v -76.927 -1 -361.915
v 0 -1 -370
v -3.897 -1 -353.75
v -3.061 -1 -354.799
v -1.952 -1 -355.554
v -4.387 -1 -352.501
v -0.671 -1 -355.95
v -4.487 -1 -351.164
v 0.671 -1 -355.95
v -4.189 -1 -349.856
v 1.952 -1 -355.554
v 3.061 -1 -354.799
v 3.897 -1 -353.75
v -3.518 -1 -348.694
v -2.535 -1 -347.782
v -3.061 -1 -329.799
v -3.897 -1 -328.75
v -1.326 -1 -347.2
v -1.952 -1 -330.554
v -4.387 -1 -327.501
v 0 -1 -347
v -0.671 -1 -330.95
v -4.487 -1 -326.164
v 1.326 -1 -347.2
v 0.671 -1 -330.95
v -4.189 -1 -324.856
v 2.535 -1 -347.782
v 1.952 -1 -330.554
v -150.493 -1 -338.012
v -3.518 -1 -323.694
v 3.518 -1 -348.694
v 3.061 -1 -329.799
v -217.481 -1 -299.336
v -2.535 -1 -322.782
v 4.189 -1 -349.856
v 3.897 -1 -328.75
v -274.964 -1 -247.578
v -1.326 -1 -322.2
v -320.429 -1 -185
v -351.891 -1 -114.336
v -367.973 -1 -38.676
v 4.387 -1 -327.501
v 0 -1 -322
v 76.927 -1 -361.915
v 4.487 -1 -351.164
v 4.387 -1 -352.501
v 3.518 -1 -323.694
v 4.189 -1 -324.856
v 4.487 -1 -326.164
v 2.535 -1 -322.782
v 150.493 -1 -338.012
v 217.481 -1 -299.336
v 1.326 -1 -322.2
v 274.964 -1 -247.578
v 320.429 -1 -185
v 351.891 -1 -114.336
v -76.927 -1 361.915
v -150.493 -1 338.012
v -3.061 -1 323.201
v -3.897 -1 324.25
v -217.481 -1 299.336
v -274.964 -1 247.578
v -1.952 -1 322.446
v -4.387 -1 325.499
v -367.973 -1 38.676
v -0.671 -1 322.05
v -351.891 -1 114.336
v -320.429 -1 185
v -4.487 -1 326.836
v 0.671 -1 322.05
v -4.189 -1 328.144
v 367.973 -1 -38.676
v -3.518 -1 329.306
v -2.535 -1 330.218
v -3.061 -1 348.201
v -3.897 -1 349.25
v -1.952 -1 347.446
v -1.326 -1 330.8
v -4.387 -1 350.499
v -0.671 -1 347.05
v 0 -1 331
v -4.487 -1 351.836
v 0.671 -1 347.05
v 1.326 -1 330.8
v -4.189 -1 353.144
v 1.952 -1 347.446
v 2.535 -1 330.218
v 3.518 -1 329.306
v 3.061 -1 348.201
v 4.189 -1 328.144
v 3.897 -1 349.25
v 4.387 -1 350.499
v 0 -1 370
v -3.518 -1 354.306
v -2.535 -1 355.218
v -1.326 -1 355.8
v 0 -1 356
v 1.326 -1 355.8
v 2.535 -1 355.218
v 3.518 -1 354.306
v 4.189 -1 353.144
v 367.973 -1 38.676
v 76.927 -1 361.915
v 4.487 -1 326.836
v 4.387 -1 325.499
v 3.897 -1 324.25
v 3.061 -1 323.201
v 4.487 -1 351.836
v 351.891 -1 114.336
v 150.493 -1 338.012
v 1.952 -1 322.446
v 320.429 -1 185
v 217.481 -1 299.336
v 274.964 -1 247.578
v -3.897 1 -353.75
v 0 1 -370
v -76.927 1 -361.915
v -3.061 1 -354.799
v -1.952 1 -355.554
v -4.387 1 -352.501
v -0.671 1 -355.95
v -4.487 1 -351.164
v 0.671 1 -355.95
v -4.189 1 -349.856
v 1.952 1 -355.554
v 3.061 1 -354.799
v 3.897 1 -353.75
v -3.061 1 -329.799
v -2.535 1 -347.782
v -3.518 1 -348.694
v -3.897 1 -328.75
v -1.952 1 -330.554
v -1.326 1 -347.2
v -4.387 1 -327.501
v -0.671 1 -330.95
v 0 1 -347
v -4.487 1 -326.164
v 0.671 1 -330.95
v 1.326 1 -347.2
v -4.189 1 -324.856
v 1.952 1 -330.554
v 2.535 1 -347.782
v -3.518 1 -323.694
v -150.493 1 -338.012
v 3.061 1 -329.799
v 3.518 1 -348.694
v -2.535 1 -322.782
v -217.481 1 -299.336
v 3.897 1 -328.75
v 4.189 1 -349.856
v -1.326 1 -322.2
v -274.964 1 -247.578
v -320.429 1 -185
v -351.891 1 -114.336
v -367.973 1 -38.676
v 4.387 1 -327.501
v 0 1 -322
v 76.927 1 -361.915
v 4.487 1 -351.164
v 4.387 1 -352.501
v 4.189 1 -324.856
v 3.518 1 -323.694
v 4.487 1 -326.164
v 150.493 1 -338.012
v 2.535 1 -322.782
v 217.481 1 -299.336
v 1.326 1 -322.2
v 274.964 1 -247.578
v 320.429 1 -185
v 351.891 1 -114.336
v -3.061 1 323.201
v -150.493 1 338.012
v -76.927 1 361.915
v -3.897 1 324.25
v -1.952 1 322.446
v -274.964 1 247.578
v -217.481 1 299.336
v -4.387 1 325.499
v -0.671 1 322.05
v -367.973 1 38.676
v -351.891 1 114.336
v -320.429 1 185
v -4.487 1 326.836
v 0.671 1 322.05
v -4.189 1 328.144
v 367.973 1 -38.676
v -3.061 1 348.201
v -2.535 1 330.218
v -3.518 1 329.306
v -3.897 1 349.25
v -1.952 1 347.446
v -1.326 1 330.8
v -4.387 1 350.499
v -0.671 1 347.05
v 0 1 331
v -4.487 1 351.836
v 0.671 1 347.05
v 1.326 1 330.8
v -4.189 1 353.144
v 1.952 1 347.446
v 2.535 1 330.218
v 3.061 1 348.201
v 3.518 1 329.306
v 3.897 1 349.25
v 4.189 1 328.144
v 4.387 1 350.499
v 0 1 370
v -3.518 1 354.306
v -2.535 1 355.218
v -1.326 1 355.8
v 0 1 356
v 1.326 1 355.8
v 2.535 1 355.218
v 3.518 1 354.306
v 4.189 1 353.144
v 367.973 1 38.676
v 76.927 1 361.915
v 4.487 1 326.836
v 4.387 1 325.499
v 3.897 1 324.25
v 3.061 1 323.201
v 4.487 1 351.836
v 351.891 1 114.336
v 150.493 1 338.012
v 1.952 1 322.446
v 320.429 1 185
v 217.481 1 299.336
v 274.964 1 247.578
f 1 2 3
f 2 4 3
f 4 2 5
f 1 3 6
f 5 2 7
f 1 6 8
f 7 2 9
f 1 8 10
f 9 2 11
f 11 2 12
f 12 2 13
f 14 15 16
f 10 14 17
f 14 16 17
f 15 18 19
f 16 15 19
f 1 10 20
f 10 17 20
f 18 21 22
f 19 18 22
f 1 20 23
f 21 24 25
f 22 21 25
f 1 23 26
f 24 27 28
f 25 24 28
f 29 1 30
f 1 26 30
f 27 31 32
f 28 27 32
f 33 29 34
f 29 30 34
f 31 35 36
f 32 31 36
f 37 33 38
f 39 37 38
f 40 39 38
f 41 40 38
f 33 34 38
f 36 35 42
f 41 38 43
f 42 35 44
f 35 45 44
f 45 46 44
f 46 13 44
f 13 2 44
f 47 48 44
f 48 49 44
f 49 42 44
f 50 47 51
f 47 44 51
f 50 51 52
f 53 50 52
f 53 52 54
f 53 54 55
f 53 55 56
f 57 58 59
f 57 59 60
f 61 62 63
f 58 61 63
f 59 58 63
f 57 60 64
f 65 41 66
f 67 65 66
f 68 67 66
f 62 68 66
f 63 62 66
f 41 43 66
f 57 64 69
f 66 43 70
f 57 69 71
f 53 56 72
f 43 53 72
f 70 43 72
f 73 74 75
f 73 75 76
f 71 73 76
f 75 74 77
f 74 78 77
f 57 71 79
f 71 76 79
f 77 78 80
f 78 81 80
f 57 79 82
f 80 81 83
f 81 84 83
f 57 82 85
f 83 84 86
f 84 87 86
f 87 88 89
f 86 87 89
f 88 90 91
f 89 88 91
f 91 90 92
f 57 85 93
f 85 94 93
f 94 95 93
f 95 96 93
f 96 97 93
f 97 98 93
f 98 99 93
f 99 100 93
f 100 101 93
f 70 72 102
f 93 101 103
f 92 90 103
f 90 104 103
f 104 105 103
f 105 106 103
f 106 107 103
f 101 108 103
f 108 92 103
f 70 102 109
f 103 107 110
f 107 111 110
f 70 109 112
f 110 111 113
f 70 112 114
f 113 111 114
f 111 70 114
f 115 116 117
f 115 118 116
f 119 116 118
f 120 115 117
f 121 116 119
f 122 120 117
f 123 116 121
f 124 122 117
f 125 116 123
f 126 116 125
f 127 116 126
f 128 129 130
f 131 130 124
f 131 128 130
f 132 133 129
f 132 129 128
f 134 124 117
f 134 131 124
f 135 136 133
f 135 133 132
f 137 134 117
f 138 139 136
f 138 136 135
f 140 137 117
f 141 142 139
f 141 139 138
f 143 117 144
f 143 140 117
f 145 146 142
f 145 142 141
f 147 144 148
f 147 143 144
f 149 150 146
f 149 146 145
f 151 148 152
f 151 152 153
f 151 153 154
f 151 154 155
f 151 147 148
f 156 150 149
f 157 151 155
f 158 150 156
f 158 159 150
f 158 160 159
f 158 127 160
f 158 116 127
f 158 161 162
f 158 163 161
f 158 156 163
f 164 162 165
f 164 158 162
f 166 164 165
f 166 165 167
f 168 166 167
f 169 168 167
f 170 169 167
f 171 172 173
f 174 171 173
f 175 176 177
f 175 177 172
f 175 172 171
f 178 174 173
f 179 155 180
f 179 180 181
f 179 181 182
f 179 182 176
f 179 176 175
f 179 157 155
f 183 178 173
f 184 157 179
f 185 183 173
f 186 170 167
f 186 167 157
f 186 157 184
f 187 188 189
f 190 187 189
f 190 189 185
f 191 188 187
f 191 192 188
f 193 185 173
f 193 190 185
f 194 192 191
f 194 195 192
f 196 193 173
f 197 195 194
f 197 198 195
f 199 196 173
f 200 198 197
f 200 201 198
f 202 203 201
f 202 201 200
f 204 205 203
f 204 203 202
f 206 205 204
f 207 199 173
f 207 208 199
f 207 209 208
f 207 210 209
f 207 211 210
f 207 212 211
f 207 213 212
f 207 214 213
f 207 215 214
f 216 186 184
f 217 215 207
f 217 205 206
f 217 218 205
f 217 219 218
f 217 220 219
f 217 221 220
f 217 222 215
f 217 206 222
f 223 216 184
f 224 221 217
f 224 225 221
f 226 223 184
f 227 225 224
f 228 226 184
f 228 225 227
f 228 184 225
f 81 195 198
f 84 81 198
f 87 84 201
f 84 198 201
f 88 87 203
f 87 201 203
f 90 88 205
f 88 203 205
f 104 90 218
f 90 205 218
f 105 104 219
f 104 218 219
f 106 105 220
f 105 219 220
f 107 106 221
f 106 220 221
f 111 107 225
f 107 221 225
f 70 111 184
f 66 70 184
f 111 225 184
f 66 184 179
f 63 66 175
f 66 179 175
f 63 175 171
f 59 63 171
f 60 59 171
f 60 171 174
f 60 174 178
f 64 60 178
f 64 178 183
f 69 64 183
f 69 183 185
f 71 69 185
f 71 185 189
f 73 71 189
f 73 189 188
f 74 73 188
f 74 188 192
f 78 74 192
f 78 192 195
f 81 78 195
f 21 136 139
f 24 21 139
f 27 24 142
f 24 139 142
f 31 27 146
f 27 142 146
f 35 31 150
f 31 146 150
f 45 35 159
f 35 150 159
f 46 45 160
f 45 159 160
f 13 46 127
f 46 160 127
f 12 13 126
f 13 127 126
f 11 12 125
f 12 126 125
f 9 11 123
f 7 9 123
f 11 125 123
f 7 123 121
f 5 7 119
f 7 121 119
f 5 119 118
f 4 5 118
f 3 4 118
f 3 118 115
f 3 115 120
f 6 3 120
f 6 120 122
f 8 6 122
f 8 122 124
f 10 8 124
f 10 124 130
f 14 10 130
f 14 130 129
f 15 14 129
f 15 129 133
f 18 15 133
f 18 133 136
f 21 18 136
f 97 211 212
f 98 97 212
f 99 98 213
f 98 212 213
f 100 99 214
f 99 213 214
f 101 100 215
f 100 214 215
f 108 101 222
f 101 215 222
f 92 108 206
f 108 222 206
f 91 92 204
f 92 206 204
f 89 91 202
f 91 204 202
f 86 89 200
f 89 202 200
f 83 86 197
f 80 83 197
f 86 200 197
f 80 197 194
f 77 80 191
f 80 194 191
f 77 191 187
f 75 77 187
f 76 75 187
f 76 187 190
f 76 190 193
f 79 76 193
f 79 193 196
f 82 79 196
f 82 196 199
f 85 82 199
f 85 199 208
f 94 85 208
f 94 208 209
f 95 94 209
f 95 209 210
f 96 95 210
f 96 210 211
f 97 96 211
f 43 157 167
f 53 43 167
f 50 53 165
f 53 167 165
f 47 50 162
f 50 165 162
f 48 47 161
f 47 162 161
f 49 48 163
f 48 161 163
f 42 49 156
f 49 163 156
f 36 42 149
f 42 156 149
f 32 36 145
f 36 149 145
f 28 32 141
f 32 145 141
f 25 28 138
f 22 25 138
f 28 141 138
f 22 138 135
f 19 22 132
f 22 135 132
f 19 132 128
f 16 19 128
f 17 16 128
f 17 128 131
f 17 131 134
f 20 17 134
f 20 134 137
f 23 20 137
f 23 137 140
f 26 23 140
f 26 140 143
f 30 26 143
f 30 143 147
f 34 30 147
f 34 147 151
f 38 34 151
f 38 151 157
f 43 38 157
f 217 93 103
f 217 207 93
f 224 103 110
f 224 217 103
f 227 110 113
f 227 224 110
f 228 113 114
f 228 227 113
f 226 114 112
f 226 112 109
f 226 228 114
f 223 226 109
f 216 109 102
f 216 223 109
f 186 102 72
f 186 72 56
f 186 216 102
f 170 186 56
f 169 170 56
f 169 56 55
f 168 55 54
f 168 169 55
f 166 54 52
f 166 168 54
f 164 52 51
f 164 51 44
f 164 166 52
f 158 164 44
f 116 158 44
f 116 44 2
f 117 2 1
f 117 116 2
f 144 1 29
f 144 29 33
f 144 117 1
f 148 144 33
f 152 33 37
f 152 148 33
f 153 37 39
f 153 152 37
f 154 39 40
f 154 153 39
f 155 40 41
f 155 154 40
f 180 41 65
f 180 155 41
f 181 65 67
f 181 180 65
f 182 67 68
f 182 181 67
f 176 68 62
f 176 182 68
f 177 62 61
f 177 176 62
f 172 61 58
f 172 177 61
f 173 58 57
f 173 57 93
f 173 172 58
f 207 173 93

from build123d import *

# Parameters (mm, degrees)
SKETCH1_R           = 370
BOSS_EXTRUDE1_DEPTH = 1
CUT_EXTRUDE1_REACH  = 525.263
SKETCH2_R           = 4.5


with BuildPart() as part:
    # Sketch1 → Boss-Extrude1 (new, symmetric)
    with BuildSketch(Plane(origin=(0, 0, 0), x_dir=(1, 0, 0), z_dir=(0, 1, 0))):
        with Locations(Location((0, 0, 0), (0, 0, 270))):
            Circle(SKETCH1_R)
    extrude(amount=BOSS_EXTRUDE1_DEPTH, both=True)

    # Sketch2 → Cut-Extrude1 (cut, up to next)
    with BuildSketch(Plane(origin=(0, 1, 0), x_dir=(1, 0, 0), z_dir=(0, 1, 0)), mode=Mode.PRIVATE) as cut_extrude1_sk1:
        with Locations(Location((0, -351.5, 0), (0, 0, 270))):
            Circle(SKETCH2_R)
    cut_extrude1_tool1 = extrude(cut_extrude1_sk1.sketch, amount=-CUT_EXTRUDE1_REACH, mode=Mode.PRIVATE) & part.part
    # Sketch2 → Cut-Extrude1 (cut, up to next)
    with BuildSketch(Plane(origin=(0, 1, 0), x_dir=(1, 0, 0), z_dir=(0, 1, 0)), mode=Mode.PRIVATE) as cut_extrude1_sk2:
        with Locations(Location((0, -326.5, 0), (0, 0, 270))):
            Circle(SKETCH2_R)
    cut_extrude1_tool2 = extrude(cut_extrude1_sk2.sketch, amount=-CUT_EXTRUDE1_REACH, mode=Mode.PRIVATE) & part.part
    # Sketch2 → Cut-Extrude1 (cut, up to next)
    with BuildSketch(Plane(origin=(0, 1, 0), x_dir=(1, 0, 0), z_dir=(0, 1, 0)), mode=Mode.PRIVATE) as cut_extrude1_sk3:
        with Locations(Location((0, 326.5, 0), (0, 0, 270))):
            Circle(SKETCH2_R)
    cut_extrude1_tool3 = extrude(cut_extrude1_sk3.sketch, amount=-CUT_EXTRUDE1_REACH, mode=Mode.PRIVATE) & part.part
    # Sketch2 → Cut-Extrude1 (cut, up to next)
    with BuildSketch(Plane(origin=(0, 1, 0), x_dir=(1, 0, 0), z_dir=(0, 1, 0)), mode=Mode.PRIVATE) as cut_extrude1_sk4:
        with Locations(Location((0, 351.5, 0), (0, 0, 270))):
            Circle(SKETCH2_R)
    cut_extrude1_tool4 = extrude(cut_extrude1_sk4.sketch, amount=-CUT_EXTRUDE1_REACH, mode=Mode.PRIVATE) & part.part
    add(cut_extrude1_tool1.solids().sort_by_distance((0, 1, 351.5))[0], mode=Mode.SUBTRACT)
    add(cut_extrude1_tool2.solids().sort_by_distance((0, 1, 326.5))[0], mode=Mode.SUBTRACT)
    add(cut_extrude1_tool3.solids().sort_by_distance((0, 1, -326.5))[0], mode=Mode.SUBTRACT)
    add(cut_extrude1_tool4.solids().sort_by_distance((0, 1, -351.5))[0], mode=Mode.SUBTRACT)


solid = part.part
